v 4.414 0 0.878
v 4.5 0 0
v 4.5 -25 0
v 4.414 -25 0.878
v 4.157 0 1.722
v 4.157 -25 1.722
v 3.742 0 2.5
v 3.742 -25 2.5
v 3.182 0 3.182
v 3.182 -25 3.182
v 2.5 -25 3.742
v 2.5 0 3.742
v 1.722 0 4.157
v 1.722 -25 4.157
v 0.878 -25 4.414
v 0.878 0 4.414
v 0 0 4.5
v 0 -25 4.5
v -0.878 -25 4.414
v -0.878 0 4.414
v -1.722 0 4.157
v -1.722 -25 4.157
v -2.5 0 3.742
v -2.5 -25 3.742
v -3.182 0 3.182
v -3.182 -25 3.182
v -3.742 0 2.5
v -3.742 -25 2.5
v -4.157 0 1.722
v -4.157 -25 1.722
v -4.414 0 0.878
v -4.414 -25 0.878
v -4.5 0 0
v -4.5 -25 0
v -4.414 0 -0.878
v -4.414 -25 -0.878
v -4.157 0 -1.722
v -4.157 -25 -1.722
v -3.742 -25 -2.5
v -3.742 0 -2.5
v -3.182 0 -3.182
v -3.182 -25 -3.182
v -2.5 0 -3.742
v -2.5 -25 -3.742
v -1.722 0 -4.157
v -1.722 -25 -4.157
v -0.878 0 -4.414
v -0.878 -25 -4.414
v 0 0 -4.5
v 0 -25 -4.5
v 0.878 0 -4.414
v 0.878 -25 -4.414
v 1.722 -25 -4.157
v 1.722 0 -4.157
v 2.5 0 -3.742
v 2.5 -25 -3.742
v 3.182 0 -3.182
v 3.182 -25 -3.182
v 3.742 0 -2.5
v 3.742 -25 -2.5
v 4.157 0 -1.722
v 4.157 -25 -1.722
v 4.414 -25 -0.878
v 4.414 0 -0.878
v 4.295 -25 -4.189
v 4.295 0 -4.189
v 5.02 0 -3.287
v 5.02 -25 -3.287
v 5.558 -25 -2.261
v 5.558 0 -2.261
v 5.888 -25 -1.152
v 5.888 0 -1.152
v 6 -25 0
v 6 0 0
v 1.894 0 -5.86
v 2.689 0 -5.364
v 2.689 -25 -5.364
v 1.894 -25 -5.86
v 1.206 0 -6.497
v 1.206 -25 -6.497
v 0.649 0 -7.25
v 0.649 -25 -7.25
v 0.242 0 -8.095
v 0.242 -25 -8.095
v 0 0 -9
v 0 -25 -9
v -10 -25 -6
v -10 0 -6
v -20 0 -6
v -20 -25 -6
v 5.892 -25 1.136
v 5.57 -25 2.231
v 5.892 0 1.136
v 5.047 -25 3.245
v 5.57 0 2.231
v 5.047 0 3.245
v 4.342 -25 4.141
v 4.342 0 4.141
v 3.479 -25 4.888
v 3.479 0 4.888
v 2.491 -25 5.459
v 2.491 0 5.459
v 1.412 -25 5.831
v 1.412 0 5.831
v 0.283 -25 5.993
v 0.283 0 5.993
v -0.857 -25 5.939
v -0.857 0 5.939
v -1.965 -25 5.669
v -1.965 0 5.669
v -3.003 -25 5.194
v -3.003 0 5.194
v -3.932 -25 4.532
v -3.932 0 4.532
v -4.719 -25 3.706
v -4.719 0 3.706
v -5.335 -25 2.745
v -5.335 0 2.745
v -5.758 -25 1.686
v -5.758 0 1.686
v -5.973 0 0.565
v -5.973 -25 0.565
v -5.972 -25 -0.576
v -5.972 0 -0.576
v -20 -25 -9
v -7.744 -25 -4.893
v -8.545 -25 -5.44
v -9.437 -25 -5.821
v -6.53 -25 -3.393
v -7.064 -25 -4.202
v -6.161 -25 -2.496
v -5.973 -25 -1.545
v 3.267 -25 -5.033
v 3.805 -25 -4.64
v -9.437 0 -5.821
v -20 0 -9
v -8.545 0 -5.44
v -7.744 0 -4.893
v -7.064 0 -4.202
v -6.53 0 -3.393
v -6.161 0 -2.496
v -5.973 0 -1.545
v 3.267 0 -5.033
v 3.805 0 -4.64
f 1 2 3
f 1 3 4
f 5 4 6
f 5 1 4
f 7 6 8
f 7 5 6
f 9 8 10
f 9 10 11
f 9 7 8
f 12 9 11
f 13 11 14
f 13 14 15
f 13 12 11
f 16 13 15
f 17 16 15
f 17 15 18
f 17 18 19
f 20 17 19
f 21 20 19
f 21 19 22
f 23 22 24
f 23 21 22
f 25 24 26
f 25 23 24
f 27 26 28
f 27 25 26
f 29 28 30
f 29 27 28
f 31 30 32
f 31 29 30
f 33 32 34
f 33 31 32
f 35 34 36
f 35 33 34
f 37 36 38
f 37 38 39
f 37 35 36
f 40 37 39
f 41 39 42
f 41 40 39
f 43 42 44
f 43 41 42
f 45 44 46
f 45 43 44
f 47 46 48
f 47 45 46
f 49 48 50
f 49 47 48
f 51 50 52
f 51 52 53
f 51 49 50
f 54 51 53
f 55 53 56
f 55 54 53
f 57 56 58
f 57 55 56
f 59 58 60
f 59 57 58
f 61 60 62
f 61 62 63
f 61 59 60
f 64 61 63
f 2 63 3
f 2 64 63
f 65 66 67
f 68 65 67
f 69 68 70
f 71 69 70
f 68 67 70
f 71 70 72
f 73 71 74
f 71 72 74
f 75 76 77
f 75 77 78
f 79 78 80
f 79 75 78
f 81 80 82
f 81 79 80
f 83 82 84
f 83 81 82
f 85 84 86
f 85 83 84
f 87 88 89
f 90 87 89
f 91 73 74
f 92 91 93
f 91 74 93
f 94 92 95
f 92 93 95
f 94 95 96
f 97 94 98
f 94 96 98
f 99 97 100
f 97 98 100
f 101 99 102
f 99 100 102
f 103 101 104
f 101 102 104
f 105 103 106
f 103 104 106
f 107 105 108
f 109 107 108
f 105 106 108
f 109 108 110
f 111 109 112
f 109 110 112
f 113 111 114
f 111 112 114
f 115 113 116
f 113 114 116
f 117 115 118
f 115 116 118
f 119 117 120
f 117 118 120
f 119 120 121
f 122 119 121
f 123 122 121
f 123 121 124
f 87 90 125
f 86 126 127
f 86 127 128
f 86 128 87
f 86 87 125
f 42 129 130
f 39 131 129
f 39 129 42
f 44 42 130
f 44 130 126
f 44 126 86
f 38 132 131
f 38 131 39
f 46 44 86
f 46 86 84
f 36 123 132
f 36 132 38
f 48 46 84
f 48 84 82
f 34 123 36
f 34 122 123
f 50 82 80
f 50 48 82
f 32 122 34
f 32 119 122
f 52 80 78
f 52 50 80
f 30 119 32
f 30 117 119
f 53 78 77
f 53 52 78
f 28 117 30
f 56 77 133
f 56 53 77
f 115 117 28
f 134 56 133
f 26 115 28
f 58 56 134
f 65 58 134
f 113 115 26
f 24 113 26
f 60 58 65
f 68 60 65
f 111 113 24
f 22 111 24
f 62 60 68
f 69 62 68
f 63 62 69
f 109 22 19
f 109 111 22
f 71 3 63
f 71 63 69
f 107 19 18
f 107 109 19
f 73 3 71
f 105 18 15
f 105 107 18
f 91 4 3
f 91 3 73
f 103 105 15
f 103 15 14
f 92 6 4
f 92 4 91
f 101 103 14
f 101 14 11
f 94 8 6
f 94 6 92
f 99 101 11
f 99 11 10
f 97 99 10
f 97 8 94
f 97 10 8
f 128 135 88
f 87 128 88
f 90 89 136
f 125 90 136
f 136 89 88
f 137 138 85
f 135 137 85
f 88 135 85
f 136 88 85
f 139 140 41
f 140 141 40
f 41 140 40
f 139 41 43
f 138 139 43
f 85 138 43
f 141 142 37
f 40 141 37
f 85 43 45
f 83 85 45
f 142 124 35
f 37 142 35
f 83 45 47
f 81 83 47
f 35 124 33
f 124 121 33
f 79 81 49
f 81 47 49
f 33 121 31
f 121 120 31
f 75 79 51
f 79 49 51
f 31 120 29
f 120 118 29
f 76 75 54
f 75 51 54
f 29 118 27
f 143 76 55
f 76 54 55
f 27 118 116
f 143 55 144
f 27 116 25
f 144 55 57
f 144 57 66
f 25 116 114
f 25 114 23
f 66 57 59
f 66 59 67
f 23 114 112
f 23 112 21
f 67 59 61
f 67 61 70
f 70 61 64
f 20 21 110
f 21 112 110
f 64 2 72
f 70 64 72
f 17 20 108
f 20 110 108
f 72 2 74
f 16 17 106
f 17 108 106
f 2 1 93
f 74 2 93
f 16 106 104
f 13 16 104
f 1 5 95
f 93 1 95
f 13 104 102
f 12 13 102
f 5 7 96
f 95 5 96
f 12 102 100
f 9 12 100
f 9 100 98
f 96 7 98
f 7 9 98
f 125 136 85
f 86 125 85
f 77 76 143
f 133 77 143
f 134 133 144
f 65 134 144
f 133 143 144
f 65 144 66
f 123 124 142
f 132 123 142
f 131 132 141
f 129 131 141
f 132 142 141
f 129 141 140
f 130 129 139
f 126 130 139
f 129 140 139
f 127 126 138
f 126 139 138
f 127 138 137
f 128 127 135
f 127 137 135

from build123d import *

# Parameters (mm, degrees)
F0_R        = 4.5
F1_DEPTH    = 25
F2_T1_DEPTH = 25


# Not quite as in the source:
# - a fillet or chamfer that OpenCascade refuses, or shapes differently, is made with other operations: its cross-section is extruded or revolved along the edge and cut away or added


with BuildPart() as f1:
    # F0 (on Front) → F1 (new body)
    with BuildSketch(Plane.XZ):
        with BuildLine():
            ThreePointArc((4.2953224556, -4.1892964806), (5.5575144954, -2.2614227011), (6, 0))
            ThreePointArc((6, 0), (-2.2614227011, 5.5575144954), (-4.2953224556, -4.1892964806))
            ThreePointArc((-4.2953224556, -4.1892964806), (-2.3306888592, -5.5288235133), (0, -6))
            ThreePointArc((0, -6), (2.3306888592, -5.5288235133), (4.2953224556, -4.1892964806))
        make_face()
        Circle(F0_R, mode=Mode.SUBTRACT)
        Polygon((0, -9), (0, -6), (-10, -6), (-20, -6), (-20, -9), align=None)
        with BuildLine():
            ThreePointArc((0, -6), (-2.3306888592, -5.5288235133), (-4.2953224556, -4.1892964806))
            Line((-4.2953224556, -4.1892964806), (-10, -6))
            Line((-10, -6), (0, -6))
        make_face()
    extrude(amount=F1_DEPTH)

    # F2: fillet of radius 5 on 2 edges, made by hand

    # F2_s2 → F2_t1 (join)
    with BuildSketch(Plane.XZ):
        with BuildLine():
            ThreePointArc((-5.9723157586, -0.5757121498), (-6.7770271427, -3.8109383875), (-9.4365815374, -5.8211671413))
            Line((-9.4365815374, -5.8211671413), (-4.2953224556, -4.1892964806))
            ThreePointArc((-4.2953224556, -4.1892964806), (-5.4424807352, -2.5257480964), (-5.9723157586, -0.5757121498))
        make_face()
        with BuildLine():
            ThreePointArc((2.6891271741, -5.3636363636), (0.9099152249, -6.8603913833), (0, -9))
            Line((0, -9), (0, -6))
            ThreePointArc((0, -6), (1.3816985594, -5.8387420812), (2.6891271741, -5.3636363636))
        make_face()
    extrude(amount=F2_T1_DEPTH)


solid = f1.part
